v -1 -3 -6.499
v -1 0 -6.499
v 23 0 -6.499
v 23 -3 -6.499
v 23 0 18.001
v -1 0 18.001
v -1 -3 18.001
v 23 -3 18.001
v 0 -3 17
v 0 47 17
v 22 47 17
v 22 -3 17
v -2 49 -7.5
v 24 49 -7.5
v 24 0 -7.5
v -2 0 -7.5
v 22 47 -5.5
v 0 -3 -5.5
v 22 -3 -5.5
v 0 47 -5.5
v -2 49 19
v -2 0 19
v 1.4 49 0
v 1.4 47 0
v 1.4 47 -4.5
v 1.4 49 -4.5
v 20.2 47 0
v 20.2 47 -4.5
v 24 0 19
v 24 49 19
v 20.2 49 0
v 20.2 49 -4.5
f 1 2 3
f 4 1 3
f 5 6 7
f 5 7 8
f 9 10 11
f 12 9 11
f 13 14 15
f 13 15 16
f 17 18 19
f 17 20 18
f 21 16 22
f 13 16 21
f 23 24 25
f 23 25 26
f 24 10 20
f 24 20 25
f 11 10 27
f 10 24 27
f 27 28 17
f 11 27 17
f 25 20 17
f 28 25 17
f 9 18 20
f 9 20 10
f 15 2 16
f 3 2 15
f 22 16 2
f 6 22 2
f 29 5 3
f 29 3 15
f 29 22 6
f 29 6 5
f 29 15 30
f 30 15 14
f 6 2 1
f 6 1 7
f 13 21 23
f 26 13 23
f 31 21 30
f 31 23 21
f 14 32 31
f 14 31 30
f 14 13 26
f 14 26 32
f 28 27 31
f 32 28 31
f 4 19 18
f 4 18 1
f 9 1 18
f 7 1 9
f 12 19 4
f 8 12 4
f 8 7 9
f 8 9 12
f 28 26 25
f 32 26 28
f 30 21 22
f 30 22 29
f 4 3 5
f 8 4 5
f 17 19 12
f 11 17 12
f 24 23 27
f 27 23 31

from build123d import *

# Parameters (mm, degrees)
EXTRUDE_1_DEPTH      = 17
EXTRUDE_1_DEPTH_BACK = 5.5
SKETCH_2_W           = 26
SKETCH_2_H           = 51
SKETCH_2_W_2         = 22
SKETCH_2_H_2         = 47
SKETCH_3_W           = 26
SKETCH_3_H           = 51
EXTRUDE_2_DEPTH      = 2
CUT_EXTRUDE_START    = -17
SKETCH_4_W           = 18.8
SKETCH_4_H           = 2
CUT_EXTRUDE_1_DEPTH  = 4.5
SKETCH_5_W           = 26
SKETCH_5_H           = 51
EXTRUDE_3_DEPTH      = 2
SKETCH_6_W           = 26
SKETCH_6_H           = 26.5
CUT_EXTRUDE_2_DEPTH  = 2
SKETCH_7_W           = 24
SKETCH_7_H           = 24.5
SKETCH_7_W_2         = 22
SKETCH_7_H_2         = 22.5
EXTRUDE_4_DEPTH      = 3


with BuildPart() as part:
    # 草图2 → 凸台-拉伸1 (new, two sides: drawn at the far end of the back side and taken through both)
    with BuildSketch(Plane.XY.offset(-EXTRUDE_1_DEPTH_BACK)):
        with Locations((11, 23.5)):
            Rectangle(SKETCH_2_W, SKETCH_2_H)
        with Locations((11, 23.5)):
            Rectangle(SKETCH_2_W_2, SKETCH_2_H_2, mode=Mode.SUBTRACT)
    extrude(amount=EXTRUDE_1_DEPTH + EXTRUDE_1_DEPTH_BACK)

    # 草图3 → 凸台-拉伸2 (add)
    with BuildSketch(Plane(origin=(0, 0, -5.5), x_dir=(-1, 0, 0), z_dir=(0, 0, -1))):
        with Locations((-11, 23.5)):
            Rectangle(SKETCH_3_W, SKETCH_3_H)
    extrude(amount=EXTRUDE_2_DEPTH)

    # 草图4 → 切除-拉伸1 (cut)
    with BuildSketch(Plane.XY.offset(17).offset(CUT_EXTRUDE_START)):
        with Locations((10.8, 48)):
            Rectangle(SKETCH_4_W, SKETCH_4_H)
    extrude(amount=-CUT_EXTRUDE_1_DEPTH, mode=Mode.SUBTRACT)

    # 草图5 → 凸台-拉伸3 (add)
    with BuildSketch(Plane.XY.offset(17)):
        with Locations((11, 23.5)):
            Rectangle(SKETCH_5_W, SKETCH_5_H)
    extrude(amount=EXTRUDE_3_DEPTH)

    # 草图6 → 切除-拉伸2 (cut)
    with BuildSketch(Plane.XZ.offset(2)):
        with Locations((11, 5.75)):
            Rectangle(SKETCH_6_W, SKETCH_6_H)
    extrude(amount=-CUT_EXTRUDE_2_DEPTH, mode=Mode.SUBTRACT)

    # 草图7 → 凸台-拉伸4 (add)
    with BuildSketch(Plane.XZ):
        with Locations((11, 5.750930711)):
            Rectangle(SKETCH_7_W, SKETCH_7_H)
        with Locations((11, 5.75)):
            Rectangle(SKETCH_7_W_2, SKETCH_7_H_2, mode=Mode.SUBTRACT)
    extrude(amount=EXTRUDE_4_DEPTH)


solid = part.part
